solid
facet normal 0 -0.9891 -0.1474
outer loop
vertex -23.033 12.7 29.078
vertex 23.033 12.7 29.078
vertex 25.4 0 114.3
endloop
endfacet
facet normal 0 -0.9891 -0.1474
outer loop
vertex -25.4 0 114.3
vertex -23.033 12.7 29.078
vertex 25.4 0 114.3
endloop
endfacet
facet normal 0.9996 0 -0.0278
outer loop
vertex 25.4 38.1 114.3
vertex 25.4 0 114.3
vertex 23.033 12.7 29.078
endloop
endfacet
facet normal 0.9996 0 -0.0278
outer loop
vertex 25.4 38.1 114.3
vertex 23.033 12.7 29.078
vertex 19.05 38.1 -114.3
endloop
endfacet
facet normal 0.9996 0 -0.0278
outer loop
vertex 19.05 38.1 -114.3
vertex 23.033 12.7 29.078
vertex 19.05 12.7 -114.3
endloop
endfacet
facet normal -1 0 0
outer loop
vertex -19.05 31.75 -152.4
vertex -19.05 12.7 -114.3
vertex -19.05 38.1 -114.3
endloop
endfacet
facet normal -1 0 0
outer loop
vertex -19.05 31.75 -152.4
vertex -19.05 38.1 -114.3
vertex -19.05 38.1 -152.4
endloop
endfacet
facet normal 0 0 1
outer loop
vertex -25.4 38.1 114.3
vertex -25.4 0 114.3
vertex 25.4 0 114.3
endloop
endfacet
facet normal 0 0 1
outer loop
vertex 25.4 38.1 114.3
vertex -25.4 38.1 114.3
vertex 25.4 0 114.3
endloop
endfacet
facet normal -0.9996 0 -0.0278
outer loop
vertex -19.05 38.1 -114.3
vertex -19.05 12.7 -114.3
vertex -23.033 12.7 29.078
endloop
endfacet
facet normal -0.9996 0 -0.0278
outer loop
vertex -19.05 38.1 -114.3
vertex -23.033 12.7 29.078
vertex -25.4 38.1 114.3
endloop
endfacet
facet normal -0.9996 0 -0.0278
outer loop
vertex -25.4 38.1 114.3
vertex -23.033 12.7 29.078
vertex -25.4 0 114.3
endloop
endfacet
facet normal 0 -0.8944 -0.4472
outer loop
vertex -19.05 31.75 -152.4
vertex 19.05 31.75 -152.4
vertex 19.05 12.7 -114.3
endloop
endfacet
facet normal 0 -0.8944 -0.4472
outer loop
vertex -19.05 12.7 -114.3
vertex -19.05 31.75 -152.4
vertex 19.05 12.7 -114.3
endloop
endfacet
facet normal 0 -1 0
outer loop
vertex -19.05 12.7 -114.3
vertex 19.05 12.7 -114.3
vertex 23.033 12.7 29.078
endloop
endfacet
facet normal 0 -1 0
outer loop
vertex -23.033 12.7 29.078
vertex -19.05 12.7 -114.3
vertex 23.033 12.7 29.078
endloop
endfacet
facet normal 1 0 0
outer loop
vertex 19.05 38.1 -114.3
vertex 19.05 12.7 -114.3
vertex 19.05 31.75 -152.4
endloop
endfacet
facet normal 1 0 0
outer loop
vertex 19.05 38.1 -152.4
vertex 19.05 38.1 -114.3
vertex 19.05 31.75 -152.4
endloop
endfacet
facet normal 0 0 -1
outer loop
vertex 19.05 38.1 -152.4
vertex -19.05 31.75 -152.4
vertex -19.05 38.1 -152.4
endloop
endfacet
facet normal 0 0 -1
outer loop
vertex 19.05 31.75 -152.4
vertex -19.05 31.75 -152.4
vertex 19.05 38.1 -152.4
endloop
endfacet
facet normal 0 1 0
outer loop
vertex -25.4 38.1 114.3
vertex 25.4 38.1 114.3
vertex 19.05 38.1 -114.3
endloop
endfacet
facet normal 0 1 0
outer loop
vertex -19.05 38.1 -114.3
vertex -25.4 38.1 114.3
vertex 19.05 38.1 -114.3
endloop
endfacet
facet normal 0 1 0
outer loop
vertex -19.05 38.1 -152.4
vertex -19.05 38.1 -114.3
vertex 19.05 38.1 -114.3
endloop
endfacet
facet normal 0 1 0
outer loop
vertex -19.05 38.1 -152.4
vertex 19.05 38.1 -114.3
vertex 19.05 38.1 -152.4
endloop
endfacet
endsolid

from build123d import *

# Parameters (mm, degrees)
SKETCH1_W           = 38.1
SKETCH1_H           = 38.1
BOSS_EXTRUDE2_DEPTH = 50.8
SKETCH11_W          = 266.7
SKETCH11_H          = 12.7
CUT_EXTRUDE6_DEPTH  = 51.8


with BuildPart() as part:
    # Sketch1 → Boss-Extrude2 (new body)
    with BuildSketch(Plane(origin=(0, 0, 0), x_dir=(1, 0, 0), z_dir=(0, 1, 0))):
        Polygon((-19.05, 114.3), (-25.4, -114.3), (25.4, -114.3), (19.05, 114.3), align=None)
        with Locations((0, 133.35)):
            Rectangle(SKETCH1_W, SKETCH1_H)
    extrude(amount=BOSS_EXTRUDE2_DEPTH)

    # Sketch11 → Cut-Extrude6 (cut, through all)
    with BuildSketch(Plane(origin=(25.4, 0, 0), x_dir=(0, 0, -1), z_dir=(1, 0, 0))):
        Polygon((114.3, 12.7), (-29.077687403, 12.7), (-114.3, 0), (152.4, 0), (152.4, 12.7), align=None)
        with Locations((19.05, 44.45)):
            Rectangle(SKETCH11_W, SKETCH11_H)
        Polygon((152.4, 12.7), (152.4, 31.75), (114.3, 12.7), align=None)
    extrude(amount=-CUT_EXTRUDE6_DEPTH, mode=Mode.SUBTRACT)


solid = part.part
